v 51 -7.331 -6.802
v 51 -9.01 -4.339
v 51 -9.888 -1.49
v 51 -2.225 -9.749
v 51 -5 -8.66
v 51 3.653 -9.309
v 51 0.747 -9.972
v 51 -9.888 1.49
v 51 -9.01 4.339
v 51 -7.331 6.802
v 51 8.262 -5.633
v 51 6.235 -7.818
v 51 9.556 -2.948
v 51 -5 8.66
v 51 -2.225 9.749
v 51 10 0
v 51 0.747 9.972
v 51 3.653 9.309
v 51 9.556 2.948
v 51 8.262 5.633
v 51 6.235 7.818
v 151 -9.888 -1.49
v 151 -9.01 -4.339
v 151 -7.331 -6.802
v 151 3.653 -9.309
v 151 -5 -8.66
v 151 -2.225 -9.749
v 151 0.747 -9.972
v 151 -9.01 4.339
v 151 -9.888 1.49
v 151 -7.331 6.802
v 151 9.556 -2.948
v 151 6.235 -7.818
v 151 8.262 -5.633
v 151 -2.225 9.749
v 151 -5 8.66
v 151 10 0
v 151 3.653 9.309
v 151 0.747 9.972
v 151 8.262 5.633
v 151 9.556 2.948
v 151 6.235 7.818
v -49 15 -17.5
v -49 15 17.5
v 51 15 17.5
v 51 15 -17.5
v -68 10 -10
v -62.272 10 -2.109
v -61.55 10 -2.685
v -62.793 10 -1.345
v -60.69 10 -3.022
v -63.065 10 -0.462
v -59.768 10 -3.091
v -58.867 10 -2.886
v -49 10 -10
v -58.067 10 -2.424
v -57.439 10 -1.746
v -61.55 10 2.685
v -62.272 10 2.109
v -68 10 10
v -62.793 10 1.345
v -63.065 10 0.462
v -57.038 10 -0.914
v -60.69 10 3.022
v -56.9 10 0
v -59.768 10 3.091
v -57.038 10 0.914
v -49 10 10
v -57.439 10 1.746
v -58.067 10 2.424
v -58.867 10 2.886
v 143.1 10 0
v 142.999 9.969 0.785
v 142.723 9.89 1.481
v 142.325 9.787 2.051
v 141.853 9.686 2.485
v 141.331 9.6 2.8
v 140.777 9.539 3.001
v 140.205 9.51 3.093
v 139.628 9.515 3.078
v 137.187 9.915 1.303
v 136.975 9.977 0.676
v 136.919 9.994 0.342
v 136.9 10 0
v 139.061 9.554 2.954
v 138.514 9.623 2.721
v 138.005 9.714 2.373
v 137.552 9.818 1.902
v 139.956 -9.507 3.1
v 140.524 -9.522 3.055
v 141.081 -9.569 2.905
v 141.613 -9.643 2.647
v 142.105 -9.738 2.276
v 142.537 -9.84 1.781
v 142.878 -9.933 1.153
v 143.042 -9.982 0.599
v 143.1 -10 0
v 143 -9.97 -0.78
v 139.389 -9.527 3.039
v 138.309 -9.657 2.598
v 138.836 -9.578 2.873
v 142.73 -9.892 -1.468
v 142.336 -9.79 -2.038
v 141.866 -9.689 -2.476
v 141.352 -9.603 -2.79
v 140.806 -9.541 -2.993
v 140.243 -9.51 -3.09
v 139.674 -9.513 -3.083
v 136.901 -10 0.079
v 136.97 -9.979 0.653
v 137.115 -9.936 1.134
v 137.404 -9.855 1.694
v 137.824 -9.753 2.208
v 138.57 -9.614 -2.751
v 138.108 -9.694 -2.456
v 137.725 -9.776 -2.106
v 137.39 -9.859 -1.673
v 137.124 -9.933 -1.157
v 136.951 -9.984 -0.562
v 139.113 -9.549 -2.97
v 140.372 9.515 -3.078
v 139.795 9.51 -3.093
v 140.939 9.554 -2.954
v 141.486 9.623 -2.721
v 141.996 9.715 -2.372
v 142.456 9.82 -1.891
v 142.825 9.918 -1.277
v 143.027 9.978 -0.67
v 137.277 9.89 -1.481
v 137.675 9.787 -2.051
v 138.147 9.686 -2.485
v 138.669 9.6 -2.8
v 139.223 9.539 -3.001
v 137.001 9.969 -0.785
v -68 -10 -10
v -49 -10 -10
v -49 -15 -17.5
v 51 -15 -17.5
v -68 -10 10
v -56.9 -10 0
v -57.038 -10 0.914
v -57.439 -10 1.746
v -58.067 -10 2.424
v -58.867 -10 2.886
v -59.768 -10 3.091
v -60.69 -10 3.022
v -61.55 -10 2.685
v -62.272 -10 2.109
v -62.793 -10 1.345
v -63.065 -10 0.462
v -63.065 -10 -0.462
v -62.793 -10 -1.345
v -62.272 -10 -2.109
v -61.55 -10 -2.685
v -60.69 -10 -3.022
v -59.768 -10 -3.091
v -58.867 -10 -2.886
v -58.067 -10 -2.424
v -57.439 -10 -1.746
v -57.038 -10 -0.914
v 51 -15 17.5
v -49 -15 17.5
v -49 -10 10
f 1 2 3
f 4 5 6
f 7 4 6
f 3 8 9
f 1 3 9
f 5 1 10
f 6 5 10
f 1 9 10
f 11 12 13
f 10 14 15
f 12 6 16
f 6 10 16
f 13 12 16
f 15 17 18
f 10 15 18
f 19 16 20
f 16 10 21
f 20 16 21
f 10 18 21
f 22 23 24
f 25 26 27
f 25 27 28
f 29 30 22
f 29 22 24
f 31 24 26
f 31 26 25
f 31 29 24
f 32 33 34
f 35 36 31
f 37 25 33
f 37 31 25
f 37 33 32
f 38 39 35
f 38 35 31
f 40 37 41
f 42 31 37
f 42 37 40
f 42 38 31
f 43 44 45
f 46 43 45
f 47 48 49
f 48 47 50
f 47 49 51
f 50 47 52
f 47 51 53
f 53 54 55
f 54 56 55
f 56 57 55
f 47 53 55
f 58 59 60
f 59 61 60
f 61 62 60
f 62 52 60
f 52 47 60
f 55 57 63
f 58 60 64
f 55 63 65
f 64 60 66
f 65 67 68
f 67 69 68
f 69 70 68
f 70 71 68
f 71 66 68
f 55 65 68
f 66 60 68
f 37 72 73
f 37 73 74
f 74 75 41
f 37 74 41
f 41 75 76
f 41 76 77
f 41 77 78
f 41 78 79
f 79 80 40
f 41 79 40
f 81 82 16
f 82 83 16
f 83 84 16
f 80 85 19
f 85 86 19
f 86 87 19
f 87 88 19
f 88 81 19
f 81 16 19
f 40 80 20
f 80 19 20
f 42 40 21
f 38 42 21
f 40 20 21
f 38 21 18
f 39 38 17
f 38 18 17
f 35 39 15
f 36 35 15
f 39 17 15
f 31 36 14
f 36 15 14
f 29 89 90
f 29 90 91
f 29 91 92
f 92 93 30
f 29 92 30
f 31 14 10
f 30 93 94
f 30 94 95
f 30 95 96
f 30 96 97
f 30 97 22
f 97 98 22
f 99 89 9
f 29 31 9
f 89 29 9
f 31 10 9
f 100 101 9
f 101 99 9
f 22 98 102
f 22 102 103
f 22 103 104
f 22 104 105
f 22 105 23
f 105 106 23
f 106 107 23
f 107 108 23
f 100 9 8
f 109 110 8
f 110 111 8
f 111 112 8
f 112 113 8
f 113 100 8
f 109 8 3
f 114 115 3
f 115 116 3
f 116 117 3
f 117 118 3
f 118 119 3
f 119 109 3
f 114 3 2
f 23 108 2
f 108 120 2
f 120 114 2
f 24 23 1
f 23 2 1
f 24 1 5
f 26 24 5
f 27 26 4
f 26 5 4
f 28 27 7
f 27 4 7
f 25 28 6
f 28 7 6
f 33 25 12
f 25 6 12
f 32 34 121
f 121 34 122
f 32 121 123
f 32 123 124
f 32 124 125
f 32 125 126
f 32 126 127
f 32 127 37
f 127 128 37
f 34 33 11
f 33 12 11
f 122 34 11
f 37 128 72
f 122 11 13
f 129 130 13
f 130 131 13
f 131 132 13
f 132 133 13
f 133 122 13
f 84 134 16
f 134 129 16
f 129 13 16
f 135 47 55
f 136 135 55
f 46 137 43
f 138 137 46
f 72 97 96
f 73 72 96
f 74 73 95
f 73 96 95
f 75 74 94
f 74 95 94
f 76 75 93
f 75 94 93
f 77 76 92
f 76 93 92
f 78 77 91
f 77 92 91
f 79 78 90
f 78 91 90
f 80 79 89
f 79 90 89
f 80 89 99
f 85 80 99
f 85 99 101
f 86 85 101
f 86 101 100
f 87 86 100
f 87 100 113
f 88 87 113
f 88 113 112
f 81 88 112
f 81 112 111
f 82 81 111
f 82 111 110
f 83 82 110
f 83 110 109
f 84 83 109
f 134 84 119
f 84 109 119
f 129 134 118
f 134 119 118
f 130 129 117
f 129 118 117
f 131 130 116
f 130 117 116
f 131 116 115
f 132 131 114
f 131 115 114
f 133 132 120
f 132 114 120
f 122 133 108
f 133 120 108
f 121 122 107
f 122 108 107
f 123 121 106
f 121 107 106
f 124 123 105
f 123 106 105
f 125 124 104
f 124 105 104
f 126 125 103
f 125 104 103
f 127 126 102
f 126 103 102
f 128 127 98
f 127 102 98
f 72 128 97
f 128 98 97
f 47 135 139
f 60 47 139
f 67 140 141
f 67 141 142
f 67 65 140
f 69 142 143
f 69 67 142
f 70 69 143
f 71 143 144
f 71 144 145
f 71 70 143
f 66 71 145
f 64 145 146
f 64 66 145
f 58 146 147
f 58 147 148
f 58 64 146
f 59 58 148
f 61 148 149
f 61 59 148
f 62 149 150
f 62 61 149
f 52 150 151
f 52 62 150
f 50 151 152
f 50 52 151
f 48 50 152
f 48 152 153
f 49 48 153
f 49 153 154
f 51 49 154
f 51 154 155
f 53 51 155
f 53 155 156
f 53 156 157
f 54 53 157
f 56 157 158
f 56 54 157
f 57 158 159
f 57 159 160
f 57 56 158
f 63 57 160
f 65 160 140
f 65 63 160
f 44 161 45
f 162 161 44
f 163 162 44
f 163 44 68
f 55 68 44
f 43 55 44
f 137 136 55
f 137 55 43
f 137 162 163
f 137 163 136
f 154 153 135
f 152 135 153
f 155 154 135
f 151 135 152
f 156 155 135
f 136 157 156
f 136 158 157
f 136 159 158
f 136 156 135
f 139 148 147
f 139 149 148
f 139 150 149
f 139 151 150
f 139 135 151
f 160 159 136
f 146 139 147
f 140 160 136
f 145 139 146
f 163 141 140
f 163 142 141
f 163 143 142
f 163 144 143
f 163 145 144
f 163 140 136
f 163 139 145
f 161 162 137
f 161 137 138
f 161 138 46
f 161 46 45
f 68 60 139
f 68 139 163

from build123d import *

# Parameters (mm, degrees)
F0_W     = 19
F0_H     = 20
F0_R     = 3.1
F1_DEPTH = 10
F2_DEPTH = 15
F4_R     = 10
F5_DEPTH = 100
F7_R     = 3.1
F8_DEPTH = 10


with BuildPart() as f1:
    # F0 (on Front) → F1 (new body, symmetric)
    with BuildSketch(Plane.XZ):
        with Locations((-58.5, 0)):
            Rectangle(F0_W, F0_H)
        with Locations((-60, 0)):
            Circle(F0_R, mode=Mode.SUBTRACT)
    extrude(amount=F1_DEPTH, both=True)

    # F0 (on Front) → F2 (join, symmetric)
    with BuildSketch(Plane.XZ):
        Polygon((-49, 17.5), (-49, 10), (-49, -10), (-49, -17.5), (51, -17.5), (51, 17.5), align=None)
    extrude(amount=F2_DEPTH, both=True)


with BuildPart() as f5:
    # F4 (on offset) → F5 (new body)
    with BuildSketch(Plane.YZ.offset(51)):
        Circle(F4_R)
    extrude(amount=F5_DEPTH)

    # F7 (on face) → F8 (cut, symmetric)
    with BuildSketch(Plane.XZ):
        with Locations((140, 0)):
            Circle(F7_R)
    extrude(amount=F8_DEPTH, both=True, mode=Mode.SUBTRACT)


solid = Compound([f1.part, f5.part])
